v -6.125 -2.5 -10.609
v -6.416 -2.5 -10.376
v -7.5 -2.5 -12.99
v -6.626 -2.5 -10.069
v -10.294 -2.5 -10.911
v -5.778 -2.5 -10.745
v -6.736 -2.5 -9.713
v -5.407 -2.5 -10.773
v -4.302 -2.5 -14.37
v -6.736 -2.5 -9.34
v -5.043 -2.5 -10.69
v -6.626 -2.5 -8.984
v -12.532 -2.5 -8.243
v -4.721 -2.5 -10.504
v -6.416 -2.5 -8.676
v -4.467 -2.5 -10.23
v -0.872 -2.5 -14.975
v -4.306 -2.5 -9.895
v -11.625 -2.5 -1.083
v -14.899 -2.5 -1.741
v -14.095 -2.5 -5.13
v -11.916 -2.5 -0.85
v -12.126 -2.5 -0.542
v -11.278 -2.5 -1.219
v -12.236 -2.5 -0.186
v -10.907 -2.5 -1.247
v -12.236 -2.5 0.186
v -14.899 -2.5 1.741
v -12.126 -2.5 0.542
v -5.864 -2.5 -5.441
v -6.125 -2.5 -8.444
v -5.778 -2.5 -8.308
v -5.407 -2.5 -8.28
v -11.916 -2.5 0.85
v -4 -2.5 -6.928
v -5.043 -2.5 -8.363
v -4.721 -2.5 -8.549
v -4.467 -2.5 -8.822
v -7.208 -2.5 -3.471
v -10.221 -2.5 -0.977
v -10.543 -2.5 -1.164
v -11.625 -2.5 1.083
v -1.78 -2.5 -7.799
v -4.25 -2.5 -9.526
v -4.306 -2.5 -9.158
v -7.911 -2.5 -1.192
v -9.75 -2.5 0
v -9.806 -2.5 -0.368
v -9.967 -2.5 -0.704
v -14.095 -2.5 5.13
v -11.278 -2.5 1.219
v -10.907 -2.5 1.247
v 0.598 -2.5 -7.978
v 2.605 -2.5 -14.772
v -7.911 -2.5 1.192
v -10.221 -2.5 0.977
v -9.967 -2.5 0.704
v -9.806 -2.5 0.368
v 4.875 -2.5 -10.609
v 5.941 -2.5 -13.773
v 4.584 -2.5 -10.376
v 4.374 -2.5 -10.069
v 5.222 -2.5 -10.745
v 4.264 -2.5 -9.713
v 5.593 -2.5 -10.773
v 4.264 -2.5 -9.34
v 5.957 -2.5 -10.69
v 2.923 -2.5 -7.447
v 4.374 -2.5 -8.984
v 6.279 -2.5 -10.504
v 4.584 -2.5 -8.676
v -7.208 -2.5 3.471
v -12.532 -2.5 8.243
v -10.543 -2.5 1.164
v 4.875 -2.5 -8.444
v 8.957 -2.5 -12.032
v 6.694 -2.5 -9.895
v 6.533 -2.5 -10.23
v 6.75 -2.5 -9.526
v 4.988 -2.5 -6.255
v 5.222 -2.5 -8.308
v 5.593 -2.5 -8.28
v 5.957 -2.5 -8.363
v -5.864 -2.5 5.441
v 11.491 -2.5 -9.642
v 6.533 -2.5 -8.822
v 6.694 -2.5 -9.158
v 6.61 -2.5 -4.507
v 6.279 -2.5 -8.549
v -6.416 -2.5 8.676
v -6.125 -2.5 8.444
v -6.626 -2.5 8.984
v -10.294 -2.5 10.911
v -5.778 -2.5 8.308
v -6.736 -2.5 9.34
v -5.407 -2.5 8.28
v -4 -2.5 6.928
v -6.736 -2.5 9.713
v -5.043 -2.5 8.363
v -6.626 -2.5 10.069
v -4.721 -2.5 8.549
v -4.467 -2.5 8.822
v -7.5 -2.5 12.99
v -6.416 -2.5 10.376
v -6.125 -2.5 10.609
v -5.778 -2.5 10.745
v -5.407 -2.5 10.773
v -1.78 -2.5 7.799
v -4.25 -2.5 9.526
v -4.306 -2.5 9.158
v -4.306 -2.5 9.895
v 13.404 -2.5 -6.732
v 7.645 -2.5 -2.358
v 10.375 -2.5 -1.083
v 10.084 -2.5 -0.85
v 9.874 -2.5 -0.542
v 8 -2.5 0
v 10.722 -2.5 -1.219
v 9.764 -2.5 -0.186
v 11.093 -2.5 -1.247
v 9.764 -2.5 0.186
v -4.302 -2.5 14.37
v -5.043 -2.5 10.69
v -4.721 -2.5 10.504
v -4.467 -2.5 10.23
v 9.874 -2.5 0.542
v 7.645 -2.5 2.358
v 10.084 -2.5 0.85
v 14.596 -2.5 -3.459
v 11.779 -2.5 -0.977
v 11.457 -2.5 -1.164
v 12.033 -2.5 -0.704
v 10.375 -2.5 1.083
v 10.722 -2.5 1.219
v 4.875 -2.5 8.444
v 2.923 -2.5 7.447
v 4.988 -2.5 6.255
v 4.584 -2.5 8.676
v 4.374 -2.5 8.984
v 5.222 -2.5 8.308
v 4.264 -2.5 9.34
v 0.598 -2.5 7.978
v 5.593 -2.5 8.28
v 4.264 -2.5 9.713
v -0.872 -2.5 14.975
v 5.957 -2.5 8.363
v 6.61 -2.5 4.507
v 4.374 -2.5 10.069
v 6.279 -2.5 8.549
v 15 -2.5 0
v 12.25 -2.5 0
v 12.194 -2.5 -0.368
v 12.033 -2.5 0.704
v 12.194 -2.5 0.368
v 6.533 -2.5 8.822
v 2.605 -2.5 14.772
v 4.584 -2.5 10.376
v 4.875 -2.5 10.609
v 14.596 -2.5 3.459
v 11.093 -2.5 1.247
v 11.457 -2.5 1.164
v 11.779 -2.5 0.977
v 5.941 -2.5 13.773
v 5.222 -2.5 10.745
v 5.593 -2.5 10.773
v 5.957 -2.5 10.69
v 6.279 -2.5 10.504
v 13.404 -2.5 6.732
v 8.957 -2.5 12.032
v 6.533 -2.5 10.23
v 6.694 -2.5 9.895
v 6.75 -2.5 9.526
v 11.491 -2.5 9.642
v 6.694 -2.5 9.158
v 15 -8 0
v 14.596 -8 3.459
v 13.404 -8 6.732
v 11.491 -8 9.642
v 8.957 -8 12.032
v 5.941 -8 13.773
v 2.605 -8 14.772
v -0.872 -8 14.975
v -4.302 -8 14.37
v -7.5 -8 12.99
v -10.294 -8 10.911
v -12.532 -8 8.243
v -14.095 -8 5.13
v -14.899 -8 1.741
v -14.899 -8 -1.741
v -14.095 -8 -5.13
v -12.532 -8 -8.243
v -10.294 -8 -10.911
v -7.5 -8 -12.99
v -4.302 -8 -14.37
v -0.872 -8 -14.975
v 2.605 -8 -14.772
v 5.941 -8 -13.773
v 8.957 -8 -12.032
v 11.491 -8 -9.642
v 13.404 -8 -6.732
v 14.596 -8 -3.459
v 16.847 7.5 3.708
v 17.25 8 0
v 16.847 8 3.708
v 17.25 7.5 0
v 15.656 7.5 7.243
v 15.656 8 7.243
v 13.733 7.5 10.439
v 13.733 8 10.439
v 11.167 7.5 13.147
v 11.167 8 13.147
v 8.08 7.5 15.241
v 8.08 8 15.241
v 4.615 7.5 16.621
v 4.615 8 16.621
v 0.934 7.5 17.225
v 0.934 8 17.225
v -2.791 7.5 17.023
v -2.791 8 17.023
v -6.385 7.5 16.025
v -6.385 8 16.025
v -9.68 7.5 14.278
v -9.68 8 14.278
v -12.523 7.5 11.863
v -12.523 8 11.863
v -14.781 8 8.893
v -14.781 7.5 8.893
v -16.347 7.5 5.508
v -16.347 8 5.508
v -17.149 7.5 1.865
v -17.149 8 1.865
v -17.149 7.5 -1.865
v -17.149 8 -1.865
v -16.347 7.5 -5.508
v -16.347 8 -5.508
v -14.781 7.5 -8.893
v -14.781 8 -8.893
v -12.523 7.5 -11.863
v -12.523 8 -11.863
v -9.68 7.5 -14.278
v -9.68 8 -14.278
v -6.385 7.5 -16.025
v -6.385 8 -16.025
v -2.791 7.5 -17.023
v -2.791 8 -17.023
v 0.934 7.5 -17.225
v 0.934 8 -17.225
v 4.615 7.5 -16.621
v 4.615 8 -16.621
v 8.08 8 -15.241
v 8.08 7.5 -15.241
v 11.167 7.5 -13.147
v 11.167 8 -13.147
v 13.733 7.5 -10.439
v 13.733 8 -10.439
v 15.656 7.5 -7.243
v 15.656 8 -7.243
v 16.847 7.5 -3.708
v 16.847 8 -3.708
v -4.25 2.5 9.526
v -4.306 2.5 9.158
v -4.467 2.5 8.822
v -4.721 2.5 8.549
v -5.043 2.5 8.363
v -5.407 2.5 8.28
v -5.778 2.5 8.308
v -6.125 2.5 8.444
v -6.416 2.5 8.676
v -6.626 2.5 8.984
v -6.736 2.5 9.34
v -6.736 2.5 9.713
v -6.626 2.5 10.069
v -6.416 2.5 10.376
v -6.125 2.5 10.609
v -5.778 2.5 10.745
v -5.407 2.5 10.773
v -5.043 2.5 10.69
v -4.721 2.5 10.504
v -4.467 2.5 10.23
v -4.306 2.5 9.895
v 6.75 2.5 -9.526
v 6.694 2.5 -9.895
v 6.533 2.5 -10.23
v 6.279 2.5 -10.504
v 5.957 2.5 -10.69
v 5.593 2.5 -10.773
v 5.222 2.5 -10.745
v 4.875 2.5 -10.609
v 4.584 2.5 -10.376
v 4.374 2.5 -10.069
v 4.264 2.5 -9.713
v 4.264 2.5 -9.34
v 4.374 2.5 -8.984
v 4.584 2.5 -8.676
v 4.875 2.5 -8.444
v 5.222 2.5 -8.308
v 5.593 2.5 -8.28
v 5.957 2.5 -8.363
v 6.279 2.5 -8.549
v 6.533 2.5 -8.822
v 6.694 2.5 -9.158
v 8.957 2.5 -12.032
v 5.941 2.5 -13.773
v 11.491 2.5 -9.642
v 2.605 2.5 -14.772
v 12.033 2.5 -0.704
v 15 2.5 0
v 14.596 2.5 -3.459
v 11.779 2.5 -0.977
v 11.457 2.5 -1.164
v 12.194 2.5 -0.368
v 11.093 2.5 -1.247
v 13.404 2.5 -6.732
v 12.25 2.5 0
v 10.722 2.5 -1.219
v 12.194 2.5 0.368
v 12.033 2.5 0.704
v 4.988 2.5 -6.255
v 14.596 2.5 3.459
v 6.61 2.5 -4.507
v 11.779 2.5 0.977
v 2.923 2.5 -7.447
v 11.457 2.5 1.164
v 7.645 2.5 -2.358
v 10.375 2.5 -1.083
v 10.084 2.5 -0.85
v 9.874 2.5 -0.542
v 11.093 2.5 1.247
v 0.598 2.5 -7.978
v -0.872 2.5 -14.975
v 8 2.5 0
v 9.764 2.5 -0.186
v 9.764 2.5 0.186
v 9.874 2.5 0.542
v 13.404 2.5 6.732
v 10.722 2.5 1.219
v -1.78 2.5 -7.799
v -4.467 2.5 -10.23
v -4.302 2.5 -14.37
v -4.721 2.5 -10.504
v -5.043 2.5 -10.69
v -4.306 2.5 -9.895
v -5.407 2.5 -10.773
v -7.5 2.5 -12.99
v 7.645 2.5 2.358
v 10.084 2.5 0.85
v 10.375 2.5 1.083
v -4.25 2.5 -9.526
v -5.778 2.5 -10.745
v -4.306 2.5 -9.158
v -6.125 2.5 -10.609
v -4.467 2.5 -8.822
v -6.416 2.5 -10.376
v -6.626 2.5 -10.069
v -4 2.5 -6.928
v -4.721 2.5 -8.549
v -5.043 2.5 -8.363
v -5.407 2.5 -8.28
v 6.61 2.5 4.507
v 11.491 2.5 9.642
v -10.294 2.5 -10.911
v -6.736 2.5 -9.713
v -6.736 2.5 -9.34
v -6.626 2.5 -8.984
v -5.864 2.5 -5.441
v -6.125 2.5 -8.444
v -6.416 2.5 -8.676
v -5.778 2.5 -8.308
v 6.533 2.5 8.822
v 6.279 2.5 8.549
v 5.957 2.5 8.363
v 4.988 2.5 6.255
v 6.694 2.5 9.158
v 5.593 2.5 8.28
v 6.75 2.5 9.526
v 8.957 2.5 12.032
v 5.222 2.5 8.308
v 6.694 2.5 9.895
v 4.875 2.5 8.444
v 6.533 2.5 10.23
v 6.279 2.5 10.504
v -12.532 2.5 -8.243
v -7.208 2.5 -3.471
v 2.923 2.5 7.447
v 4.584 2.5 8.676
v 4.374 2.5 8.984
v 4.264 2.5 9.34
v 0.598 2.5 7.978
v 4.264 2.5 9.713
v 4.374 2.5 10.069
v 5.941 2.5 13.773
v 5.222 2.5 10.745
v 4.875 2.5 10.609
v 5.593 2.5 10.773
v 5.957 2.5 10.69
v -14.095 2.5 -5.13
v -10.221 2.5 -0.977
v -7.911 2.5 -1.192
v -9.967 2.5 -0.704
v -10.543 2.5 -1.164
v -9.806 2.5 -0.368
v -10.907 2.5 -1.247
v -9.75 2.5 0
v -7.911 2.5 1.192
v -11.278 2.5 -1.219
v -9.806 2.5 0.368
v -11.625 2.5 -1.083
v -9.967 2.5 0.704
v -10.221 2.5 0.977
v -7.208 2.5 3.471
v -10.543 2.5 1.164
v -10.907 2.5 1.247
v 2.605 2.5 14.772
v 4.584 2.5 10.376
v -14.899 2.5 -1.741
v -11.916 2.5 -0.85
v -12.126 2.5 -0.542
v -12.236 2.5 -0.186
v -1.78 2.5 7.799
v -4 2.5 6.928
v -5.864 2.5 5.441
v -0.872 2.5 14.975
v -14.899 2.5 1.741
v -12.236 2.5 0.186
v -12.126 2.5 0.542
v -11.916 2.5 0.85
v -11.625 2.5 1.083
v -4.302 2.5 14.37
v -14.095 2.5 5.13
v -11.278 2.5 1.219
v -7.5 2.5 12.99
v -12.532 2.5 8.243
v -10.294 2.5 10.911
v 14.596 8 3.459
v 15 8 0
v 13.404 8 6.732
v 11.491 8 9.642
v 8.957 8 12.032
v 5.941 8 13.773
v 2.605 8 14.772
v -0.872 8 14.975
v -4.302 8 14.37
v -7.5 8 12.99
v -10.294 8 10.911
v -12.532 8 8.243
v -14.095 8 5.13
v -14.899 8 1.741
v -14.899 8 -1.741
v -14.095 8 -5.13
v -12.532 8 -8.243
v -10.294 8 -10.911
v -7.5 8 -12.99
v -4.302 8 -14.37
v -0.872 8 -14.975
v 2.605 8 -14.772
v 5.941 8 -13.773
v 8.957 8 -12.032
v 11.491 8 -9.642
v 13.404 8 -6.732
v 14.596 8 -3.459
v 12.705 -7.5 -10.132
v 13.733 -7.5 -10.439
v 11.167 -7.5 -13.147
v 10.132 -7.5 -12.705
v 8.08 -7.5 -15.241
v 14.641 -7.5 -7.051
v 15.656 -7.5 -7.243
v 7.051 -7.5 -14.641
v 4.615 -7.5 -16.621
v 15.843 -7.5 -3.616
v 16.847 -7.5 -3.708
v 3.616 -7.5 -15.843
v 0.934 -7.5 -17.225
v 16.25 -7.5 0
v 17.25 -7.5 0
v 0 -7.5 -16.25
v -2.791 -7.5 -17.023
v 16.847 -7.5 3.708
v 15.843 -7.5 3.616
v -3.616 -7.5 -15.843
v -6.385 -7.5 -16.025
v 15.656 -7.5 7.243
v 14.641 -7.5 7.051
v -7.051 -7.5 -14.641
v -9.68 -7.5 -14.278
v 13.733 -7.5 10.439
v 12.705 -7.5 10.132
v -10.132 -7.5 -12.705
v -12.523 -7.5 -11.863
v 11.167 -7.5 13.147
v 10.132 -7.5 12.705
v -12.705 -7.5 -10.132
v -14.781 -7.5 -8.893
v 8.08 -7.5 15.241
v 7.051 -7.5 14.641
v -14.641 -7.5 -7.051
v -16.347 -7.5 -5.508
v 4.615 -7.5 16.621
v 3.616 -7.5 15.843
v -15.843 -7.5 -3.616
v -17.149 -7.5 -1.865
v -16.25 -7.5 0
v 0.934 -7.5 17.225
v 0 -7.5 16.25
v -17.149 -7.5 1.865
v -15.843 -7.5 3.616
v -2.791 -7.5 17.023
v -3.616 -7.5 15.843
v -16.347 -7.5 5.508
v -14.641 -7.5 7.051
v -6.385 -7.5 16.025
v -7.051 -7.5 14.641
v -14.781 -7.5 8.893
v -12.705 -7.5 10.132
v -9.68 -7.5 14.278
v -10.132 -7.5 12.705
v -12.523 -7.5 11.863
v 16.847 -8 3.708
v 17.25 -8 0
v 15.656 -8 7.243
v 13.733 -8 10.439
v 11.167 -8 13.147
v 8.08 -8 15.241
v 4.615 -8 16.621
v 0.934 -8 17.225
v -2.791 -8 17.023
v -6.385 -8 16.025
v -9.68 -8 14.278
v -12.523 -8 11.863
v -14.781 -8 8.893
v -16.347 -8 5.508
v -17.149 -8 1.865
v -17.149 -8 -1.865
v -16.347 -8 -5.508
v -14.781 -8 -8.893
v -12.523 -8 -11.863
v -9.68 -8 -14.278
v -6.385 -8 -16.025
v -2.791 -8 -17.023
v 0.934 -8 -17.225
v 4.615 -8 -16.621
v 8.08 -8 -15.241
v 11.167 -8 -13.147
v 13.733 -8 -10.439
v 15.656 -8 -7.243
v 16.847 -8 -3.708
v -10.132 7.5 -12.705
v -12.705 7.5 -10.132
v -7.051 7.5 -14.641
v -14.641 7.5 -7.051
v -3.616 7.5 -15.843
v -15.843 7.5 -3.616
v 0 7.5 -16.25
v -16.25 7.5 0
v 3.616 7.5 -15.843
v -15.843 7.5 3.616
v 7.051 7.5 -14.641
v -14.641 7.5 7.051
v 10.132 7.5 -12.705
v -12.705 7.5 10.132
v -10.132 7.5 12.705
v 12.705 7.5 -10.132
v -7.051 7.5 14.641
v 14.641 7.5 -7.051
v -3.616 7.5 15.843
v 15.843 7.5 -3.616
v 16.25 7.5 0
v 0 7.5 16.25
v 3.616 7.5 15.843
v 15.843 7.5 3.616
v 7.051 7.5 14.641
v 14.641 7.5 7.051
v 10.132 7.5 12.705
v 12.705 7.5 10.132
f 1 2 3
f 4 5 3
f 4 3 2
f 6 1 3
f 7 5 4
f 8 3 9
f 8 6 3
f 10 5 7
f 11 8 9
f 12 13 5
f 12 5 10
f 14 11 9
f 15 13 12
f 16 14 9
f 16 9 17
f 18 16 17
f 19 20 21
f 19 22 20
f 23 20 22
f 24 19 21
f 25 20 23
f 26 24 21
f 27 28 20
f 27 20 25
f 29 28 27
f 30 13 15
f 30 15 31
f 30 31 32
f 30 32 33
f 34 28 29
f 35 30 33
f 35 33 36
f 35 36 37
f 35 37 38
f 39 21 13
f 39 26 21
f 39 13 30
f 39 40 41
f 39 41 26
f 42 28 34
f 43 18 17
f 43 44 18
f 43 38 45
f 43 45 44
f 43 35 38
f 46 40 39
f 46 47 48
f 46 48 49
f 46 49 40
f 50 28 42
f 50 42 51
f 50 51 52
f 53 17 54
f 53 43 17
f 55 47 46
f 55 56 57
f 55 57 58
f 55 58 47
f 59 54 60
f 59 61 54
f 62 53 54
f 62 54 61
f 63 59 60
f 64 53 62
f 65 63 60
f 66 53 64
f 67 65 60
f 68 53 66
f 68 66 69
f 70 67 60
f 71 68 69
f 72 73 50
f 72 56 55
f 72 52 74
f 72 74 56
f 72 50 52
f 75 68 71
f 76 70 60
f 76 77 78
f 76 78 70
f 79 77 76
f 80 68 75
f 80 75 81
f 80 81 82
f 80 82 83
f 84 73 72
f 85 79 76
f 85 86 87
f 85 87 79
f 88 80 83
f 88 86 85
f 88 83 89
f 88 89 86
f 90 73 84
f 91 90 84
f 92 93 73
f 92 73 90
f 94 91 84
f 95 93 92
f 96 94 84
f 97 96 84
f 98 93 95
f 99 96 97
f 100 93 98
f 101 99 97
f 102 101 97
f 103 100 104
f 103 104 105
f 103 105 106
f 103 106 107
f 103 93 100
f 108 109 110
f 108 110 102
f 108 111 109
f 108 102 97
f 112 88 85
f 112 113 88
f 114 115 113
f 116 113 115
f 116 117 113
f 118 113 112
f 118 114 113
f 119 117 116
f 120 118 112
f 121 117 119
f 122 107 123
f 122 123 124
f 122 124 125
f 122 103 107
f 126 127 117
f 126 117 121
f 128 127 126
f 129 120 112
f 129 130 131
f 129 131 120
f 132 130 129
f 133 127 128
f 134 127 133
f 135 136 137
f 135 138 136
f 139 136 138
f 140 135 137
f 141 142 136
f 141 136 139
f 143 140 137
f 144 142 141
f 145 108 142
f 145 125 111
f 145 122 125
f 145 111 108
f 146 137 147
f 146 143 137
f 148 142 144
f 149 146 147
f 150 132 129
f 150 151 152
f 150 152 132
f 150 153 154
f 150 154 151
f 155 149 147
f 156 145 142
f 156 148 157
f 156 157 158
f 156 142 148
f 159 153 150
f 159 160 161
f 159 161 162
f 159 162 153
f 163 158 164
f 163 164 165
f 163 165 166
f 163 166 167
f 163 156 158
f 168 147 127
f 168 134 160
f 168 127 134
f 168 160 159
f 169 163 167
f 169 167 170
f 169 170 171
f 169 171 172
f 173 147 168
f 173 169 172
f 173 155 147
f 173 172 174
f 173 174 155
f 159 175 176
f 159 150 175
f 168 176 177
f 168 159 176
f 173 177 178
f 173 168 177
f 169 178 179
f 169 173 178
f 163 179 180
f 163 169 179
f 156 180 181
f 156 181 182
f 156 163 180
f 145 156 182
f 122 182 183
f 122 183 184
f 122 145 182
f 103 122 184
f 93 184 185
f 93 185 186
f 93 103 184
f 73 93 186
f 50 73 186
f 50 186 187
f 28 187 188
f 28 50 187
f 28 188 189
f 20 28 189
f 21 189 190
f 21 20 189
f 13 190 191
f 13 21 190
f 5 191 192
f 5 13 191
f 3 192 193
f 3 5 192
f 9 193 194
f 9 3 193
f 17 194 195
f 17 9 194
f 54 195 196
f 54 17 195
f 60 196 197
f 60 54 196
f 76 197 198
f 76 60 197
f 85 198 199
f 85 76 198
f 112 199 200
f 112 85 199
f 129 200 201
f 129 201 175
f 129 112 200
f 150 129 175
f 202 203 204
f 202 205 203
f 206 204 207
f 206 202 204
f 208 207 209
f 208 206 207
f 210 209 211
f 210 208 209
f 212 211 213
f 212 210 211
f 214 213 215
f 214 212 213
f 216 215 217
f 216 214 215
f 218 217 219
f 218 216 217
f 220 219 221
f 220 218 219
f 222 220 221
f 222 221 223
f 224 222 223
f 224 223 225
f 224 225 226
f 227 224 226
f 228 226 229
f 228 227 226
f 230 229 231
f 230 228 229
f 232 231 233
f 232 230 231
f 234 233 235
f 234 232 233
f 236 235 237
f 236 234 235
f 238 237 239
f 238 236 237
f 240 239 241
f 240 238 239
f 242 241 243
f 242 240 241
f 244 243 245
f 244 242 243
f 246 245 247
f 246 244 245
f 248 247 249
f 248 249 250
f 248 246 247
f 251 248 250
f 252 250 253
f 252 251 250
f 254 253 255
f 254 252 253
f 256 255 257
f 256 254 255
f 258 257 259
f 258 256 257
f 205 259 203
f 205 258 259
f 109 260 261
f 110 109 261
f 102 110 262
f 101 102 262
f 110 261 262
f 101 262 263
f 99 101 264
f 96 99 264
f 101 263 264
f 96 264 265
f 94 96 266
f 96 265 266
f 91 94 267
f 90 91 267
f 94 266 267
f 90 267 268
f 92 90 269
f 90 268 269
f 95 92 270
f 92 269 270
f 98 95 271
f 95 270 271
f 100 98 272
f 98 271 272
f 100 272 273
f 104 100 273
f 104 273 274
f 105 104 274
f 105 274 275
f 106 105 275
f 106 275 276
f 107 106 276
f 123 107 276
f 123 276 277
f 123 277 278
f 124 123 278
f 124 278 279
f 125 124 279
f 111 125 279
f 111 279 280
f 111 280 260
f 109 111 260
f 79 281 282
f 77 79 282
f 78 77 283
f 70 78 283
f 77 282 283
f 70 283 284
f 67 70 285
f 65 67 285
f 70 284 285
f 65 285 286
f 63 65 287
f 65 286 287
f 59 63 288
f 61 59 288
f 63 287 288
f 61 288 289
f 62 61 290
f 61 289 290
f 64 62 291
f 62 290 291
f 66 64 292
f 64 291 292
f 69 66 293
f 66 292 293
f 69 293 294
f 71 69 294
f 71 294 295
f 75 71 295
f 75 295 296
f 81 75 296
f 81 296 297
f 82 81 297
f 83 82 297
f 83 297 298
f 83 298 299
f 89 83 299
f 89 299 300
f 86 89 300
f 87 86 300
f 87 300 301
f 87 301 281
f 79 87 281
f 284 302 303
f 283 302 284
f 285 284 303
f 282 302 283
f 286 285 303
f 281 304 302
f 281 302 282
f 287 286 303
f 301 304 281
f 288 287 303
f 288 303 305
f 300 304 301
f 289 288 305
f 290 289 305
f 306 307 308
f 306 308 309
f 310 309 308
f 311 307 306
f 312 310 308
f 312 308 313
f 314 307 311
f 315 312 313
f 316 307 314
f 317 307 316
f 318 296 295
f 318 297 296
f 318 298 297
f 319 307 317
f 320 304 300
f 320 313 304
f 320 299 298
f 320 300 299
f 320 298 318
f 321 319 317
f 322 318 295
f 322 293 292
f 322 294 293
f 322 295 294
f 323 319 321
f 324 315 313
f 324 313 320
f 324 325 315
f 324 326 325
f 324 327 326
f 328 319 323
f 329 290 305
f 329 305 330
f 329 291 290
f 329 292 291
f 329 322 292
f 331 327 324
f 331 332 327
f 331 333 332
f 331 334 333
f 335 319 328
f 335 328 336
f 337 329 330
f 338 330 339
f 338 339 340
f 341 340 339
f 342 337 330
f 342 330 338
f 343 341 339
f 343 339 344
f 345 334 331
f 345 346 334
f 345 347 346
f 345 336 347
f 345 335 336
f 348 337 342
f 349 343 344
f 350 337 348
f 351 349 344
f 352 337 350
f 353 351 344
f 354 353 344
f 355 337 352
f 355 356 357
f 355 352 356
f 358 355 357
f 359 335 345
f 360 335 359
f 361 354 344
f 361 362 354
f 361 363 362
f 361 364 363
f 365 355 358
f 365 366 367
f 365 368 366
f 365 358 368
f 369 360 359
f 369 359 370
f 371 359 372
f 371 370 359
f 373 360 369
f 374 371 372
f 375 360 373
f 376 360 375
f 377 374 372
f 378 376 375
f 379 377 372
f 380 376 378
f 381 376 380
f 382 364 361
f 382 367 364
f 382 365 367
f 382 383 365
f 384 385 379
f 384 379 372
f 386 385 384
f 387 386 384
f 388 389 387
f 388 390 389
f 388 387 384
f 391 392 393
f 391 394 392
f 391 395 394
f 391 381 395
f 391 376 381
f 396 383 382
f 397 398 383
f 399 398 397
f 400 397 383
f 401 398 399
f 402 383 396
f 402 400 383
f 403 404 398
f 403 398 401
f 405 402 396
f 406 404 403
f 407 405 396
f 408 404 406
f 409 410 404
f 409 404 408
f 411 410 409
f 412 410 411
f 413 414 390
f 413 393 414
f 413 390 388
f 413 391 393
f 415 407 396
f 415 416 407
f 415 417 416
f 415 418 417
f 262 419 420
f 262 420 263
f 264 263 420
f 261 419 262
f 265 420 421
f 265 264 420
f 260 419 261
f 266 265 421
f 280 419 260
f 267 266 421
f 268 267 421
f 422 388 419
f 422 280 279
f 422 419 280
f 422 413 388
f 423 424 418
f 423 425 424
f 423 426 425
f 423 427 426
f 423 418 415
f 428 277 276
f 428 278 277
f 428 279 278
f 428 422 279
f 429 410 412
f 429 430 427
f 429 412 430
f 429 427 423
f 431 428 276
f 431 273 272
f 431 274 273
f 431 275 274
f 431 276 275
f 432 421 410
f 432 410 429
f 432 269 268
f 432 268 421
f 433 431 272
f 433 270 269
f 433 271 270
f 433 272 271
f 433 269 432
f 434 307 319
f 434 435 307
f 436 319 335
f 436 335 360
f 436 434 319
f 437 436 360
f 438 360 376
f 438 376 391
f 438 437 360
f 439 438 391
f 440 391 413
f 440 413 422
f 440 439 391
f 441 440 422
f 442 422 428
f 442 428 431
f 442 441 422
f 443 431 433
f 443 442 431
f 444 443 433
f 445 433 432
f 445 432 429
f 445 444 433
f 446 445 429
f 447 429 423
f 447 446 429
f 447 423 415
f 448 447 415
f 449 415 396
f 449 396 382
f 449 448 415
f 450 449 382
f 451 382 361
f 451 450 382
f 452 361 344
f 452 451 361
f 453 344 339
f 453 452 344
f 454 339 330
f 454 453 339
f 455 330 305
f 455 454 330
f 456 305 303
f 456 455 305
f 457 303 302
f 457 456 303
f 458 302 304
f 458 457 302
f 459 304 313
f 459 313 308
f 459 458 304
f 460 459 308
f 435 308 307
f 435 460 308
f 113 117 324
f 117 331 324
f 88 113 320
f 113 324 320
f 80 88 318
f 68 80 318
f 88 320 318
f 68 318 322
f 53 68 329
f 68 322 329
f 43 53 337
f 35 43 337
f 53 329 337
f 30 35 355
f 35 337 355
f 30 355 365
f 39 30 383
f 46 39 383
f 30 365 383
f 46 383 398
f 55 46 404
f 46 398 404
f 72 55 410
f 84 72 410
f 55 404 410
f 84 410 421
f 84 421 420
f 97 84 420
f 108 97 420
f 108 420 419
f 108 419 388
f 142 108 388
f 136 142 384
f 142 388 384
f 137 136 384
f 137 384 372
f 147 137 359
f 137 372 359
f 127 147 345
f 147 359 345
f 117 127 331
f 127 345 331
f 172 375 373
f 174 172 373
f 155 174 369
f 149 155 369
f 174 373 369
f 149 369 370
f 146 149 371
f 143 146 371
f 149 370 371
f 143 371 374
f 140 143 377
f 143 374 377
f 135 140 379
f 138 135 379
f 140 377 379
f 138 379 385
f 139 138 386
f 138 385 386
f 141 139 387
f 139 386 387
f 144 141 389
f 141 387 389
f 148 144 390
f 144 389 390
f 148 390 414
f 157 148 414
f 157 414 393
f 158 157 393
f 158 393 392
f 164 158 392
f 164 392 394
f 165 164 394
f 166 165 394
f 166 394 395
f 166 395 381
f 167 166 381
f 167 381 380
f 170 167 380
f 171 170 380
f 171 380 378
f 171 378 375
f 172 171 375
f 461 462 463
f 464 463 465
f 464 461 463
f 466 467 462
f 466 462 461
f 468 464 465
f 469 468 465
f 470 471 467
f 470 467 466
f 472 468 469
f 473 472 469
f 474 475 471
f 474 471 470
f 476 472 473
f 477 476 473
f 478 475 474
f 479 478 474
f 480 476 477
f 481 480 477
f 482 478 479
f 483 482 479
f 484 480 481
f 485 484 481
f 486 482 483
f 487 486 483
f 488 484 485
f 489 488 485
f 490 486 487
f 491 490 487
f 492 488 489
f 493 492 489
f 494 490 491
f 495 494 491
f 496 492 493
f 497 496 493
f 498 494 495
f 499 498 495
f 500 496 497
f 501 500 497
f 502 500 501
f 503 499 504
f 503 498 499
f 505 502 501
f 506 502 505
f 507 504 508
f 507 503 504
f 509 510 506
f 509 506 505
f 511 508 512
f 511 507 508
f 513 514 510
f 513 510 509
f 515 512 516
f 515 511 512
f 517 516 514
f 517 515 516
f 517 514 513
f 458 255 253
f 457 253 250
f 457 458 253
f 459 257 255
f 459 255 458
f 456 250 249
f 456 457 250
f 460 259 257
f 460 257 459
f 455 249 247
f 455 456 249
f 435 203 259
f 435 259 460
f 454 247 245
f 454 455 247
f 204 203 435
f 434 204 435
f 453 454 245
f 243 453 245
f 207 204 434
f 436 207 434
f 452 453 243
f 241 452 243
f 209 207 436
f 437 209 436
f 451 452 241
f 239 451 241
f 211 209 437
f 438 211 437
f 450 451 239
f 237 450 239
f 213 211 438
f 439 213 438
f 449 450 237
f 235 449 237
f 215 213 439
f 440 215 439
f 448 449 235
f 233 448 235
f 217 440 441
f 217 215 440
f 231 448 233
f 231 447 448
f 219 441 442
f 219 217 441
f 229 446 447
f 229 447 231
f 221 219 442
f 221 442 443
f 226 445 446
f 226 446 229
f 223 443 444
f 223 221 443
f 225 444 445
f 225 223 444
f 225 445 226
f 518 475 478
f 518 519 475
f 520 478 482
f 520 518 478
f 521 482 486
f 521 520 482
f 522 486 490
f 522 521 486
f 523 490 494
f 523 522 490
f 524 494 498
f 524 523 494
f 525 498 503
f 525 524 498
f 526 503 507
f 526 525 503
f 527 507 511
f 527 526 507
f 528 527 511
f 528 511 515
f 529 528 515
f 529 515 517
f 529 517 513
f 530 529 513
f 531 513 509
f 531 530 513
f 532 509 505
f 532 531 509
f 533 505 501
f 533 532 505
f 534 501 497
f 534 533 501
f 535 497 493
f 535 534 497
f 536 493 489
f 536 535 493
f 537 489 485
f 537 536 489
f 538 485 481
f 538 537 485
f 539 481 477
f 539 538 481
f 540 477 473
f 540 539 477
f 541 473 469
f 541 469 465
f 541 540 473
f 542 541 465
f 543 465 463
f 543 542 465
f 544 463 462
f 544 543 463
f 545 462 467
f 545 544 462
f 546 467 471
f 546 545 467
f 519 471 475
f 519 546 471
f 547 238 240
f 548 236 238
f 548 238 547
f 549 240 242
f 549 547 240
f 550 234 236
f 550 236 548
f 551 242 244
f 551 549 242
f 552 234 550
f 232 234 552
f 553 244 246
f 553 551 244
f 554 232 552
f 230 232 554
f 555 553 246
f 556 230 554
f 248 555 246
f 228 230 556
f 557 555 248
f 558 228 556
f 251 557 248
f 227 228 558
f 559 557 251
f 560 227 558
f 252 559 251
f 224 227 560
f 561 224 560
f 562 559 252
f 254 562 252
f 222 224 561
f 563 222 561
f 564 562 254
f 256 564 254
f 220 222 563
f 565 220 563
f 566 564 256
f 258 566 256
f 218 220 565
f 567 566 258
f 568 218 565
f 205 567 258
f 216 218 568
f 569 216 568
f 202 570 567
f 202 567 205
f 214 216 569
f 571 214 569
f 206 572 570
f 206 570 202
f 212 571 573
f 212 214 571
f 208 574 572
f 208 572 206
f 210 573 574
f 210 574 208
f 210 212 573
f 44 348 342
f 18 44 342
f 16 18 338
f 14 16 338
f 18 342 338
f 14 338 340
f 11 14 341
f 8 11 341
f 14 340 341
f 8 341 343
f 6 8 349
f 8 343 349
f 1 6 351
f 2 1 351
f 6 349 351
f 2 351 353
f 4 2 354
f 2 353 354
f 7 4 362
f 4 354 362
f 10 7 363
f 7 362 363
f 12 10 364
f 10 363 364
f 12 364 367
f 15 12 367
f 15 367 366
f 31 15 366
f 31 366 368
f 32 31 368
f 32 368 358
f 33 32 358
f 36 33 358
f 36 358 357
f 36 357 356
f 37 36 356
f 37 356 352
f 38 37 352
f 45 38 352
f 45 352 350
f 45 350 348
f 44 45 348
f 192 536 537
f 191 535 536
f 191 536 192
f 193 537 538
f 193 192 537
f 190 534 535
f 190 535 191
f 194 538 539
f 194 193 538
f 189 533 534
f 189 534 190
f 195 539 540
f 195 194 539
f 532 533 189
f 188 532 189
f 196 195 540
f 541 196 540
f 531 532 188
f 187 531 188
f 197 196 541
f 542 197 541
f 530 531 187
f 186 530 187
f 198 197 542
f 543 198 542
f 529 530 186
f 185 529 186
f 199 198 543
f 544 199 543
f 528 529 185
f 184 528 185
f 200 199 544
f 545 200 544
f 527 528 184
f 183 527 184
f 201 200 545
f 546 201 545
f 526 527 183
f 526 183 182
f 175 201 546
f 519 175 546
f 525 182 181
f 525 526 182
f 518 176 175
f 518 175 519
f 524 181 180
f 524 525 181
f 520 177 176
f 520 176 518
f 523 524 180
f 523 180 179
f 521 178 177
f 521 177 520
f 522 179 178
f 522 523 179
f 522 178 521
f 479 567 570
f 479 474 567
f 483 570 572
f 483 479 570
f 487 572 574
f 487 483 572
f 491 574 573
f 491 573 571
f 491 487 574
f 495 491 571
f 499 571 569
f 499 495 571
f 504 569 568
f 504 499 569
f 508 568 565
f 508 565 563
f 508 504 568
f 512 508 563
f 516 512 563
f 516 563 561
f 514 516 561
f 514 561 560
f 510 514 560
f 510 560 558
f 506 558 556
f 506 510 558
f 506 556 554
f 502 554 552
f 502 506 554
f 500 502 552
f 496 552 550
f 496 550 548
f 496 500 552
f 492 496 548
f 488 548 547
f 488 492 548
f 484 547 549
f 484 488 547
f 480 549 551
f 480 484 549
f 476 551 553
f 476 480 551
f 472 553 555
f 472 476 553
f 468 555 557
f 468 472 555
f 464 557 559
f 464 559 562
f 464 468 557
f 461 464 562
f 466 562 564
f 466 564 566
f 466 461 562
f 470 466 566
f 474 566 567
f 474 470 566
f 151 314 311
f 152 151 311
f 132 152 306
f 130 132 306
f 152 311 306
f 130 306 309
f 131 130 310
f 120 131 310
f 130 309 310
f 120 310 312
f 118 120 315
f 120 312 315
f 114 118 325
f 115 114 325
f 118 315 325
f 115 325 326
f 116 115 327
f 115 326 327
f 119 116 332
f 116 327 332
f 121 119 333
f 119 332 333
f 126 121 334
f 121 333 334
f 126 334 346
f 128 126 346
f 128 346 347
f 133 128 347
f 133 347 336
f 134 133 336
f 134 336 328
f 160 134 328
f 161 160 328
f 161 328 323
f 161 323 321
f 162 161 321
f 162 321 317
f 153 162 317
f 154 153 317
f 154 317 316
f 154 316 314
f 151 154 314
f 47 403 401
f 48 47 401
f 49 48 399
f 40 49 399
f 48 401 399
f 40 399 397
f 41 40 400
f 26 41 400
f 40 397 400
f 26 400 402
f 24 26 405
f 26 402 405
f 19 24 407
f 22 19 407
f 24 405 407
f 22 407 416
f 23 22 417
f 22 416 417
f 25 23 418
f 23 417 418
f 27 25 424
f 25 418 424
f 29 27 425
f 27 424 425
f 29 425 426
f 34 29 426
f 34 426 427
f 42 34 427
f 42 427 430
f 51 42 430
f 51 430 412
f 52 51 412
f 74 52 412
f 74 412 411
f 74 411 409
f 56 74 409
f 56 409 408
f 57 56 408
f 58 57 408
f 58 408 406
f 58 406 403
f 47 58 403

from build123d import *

# Parameters (mm, degrees)
SKETCH2_R          = 1.25
SKETCH2_R_2        = 8
CUT_EXTRUDE1_DEPTH = 10


with BuildPart() as part:
    # Sketch1 → Revolve1 (revolve)
    with BuildSketch(Plane.XY):
        Polygon((15, 8), (17.25, 8), (17.25, 7.5), (16.25, 7.5), (16.25, -7.5), (17.25, -7.5), (17.25, -8), (15, -8), (15, -2.5), (0, -2.5), (0, 2.5), (15, 2.5), align=None)
    revolve(axis=Axis((0, 8.982990787, 0), (0, -1, 0)))

    # Sketch2 → Cut-Extrude1 (cut, symmetric)
    with BuildSketch(Plane(origin=(0, 2.5, 0), x_dir=(1, 0, 0), z_dir=(0, 1, 0))):
        with Locations((11, 0)):
            Circle(SKETCH2_R)
        with Locations((5.5, -9.526279442)):
            Circle(SKETCH2_R)
        with Locations((-5.5, -9.526279442)):
            Circle(SKETCH2_R)
        with Locations((-11, 0)):
            Circle(SKETCH2_R)
        with Locations((-5.5, 9.526279442)):
            Circle(SKETCH2_R)
        with Locations((5.5, 9.526279442)):
            Circle(SKETCH2_R)
        Circle(SKETCH2_R_2)
    extrude(amount=CUT_EXTRUDE1_DEPTH, both=True, mode=Mode.SUBTRACT)


solid = part.part
